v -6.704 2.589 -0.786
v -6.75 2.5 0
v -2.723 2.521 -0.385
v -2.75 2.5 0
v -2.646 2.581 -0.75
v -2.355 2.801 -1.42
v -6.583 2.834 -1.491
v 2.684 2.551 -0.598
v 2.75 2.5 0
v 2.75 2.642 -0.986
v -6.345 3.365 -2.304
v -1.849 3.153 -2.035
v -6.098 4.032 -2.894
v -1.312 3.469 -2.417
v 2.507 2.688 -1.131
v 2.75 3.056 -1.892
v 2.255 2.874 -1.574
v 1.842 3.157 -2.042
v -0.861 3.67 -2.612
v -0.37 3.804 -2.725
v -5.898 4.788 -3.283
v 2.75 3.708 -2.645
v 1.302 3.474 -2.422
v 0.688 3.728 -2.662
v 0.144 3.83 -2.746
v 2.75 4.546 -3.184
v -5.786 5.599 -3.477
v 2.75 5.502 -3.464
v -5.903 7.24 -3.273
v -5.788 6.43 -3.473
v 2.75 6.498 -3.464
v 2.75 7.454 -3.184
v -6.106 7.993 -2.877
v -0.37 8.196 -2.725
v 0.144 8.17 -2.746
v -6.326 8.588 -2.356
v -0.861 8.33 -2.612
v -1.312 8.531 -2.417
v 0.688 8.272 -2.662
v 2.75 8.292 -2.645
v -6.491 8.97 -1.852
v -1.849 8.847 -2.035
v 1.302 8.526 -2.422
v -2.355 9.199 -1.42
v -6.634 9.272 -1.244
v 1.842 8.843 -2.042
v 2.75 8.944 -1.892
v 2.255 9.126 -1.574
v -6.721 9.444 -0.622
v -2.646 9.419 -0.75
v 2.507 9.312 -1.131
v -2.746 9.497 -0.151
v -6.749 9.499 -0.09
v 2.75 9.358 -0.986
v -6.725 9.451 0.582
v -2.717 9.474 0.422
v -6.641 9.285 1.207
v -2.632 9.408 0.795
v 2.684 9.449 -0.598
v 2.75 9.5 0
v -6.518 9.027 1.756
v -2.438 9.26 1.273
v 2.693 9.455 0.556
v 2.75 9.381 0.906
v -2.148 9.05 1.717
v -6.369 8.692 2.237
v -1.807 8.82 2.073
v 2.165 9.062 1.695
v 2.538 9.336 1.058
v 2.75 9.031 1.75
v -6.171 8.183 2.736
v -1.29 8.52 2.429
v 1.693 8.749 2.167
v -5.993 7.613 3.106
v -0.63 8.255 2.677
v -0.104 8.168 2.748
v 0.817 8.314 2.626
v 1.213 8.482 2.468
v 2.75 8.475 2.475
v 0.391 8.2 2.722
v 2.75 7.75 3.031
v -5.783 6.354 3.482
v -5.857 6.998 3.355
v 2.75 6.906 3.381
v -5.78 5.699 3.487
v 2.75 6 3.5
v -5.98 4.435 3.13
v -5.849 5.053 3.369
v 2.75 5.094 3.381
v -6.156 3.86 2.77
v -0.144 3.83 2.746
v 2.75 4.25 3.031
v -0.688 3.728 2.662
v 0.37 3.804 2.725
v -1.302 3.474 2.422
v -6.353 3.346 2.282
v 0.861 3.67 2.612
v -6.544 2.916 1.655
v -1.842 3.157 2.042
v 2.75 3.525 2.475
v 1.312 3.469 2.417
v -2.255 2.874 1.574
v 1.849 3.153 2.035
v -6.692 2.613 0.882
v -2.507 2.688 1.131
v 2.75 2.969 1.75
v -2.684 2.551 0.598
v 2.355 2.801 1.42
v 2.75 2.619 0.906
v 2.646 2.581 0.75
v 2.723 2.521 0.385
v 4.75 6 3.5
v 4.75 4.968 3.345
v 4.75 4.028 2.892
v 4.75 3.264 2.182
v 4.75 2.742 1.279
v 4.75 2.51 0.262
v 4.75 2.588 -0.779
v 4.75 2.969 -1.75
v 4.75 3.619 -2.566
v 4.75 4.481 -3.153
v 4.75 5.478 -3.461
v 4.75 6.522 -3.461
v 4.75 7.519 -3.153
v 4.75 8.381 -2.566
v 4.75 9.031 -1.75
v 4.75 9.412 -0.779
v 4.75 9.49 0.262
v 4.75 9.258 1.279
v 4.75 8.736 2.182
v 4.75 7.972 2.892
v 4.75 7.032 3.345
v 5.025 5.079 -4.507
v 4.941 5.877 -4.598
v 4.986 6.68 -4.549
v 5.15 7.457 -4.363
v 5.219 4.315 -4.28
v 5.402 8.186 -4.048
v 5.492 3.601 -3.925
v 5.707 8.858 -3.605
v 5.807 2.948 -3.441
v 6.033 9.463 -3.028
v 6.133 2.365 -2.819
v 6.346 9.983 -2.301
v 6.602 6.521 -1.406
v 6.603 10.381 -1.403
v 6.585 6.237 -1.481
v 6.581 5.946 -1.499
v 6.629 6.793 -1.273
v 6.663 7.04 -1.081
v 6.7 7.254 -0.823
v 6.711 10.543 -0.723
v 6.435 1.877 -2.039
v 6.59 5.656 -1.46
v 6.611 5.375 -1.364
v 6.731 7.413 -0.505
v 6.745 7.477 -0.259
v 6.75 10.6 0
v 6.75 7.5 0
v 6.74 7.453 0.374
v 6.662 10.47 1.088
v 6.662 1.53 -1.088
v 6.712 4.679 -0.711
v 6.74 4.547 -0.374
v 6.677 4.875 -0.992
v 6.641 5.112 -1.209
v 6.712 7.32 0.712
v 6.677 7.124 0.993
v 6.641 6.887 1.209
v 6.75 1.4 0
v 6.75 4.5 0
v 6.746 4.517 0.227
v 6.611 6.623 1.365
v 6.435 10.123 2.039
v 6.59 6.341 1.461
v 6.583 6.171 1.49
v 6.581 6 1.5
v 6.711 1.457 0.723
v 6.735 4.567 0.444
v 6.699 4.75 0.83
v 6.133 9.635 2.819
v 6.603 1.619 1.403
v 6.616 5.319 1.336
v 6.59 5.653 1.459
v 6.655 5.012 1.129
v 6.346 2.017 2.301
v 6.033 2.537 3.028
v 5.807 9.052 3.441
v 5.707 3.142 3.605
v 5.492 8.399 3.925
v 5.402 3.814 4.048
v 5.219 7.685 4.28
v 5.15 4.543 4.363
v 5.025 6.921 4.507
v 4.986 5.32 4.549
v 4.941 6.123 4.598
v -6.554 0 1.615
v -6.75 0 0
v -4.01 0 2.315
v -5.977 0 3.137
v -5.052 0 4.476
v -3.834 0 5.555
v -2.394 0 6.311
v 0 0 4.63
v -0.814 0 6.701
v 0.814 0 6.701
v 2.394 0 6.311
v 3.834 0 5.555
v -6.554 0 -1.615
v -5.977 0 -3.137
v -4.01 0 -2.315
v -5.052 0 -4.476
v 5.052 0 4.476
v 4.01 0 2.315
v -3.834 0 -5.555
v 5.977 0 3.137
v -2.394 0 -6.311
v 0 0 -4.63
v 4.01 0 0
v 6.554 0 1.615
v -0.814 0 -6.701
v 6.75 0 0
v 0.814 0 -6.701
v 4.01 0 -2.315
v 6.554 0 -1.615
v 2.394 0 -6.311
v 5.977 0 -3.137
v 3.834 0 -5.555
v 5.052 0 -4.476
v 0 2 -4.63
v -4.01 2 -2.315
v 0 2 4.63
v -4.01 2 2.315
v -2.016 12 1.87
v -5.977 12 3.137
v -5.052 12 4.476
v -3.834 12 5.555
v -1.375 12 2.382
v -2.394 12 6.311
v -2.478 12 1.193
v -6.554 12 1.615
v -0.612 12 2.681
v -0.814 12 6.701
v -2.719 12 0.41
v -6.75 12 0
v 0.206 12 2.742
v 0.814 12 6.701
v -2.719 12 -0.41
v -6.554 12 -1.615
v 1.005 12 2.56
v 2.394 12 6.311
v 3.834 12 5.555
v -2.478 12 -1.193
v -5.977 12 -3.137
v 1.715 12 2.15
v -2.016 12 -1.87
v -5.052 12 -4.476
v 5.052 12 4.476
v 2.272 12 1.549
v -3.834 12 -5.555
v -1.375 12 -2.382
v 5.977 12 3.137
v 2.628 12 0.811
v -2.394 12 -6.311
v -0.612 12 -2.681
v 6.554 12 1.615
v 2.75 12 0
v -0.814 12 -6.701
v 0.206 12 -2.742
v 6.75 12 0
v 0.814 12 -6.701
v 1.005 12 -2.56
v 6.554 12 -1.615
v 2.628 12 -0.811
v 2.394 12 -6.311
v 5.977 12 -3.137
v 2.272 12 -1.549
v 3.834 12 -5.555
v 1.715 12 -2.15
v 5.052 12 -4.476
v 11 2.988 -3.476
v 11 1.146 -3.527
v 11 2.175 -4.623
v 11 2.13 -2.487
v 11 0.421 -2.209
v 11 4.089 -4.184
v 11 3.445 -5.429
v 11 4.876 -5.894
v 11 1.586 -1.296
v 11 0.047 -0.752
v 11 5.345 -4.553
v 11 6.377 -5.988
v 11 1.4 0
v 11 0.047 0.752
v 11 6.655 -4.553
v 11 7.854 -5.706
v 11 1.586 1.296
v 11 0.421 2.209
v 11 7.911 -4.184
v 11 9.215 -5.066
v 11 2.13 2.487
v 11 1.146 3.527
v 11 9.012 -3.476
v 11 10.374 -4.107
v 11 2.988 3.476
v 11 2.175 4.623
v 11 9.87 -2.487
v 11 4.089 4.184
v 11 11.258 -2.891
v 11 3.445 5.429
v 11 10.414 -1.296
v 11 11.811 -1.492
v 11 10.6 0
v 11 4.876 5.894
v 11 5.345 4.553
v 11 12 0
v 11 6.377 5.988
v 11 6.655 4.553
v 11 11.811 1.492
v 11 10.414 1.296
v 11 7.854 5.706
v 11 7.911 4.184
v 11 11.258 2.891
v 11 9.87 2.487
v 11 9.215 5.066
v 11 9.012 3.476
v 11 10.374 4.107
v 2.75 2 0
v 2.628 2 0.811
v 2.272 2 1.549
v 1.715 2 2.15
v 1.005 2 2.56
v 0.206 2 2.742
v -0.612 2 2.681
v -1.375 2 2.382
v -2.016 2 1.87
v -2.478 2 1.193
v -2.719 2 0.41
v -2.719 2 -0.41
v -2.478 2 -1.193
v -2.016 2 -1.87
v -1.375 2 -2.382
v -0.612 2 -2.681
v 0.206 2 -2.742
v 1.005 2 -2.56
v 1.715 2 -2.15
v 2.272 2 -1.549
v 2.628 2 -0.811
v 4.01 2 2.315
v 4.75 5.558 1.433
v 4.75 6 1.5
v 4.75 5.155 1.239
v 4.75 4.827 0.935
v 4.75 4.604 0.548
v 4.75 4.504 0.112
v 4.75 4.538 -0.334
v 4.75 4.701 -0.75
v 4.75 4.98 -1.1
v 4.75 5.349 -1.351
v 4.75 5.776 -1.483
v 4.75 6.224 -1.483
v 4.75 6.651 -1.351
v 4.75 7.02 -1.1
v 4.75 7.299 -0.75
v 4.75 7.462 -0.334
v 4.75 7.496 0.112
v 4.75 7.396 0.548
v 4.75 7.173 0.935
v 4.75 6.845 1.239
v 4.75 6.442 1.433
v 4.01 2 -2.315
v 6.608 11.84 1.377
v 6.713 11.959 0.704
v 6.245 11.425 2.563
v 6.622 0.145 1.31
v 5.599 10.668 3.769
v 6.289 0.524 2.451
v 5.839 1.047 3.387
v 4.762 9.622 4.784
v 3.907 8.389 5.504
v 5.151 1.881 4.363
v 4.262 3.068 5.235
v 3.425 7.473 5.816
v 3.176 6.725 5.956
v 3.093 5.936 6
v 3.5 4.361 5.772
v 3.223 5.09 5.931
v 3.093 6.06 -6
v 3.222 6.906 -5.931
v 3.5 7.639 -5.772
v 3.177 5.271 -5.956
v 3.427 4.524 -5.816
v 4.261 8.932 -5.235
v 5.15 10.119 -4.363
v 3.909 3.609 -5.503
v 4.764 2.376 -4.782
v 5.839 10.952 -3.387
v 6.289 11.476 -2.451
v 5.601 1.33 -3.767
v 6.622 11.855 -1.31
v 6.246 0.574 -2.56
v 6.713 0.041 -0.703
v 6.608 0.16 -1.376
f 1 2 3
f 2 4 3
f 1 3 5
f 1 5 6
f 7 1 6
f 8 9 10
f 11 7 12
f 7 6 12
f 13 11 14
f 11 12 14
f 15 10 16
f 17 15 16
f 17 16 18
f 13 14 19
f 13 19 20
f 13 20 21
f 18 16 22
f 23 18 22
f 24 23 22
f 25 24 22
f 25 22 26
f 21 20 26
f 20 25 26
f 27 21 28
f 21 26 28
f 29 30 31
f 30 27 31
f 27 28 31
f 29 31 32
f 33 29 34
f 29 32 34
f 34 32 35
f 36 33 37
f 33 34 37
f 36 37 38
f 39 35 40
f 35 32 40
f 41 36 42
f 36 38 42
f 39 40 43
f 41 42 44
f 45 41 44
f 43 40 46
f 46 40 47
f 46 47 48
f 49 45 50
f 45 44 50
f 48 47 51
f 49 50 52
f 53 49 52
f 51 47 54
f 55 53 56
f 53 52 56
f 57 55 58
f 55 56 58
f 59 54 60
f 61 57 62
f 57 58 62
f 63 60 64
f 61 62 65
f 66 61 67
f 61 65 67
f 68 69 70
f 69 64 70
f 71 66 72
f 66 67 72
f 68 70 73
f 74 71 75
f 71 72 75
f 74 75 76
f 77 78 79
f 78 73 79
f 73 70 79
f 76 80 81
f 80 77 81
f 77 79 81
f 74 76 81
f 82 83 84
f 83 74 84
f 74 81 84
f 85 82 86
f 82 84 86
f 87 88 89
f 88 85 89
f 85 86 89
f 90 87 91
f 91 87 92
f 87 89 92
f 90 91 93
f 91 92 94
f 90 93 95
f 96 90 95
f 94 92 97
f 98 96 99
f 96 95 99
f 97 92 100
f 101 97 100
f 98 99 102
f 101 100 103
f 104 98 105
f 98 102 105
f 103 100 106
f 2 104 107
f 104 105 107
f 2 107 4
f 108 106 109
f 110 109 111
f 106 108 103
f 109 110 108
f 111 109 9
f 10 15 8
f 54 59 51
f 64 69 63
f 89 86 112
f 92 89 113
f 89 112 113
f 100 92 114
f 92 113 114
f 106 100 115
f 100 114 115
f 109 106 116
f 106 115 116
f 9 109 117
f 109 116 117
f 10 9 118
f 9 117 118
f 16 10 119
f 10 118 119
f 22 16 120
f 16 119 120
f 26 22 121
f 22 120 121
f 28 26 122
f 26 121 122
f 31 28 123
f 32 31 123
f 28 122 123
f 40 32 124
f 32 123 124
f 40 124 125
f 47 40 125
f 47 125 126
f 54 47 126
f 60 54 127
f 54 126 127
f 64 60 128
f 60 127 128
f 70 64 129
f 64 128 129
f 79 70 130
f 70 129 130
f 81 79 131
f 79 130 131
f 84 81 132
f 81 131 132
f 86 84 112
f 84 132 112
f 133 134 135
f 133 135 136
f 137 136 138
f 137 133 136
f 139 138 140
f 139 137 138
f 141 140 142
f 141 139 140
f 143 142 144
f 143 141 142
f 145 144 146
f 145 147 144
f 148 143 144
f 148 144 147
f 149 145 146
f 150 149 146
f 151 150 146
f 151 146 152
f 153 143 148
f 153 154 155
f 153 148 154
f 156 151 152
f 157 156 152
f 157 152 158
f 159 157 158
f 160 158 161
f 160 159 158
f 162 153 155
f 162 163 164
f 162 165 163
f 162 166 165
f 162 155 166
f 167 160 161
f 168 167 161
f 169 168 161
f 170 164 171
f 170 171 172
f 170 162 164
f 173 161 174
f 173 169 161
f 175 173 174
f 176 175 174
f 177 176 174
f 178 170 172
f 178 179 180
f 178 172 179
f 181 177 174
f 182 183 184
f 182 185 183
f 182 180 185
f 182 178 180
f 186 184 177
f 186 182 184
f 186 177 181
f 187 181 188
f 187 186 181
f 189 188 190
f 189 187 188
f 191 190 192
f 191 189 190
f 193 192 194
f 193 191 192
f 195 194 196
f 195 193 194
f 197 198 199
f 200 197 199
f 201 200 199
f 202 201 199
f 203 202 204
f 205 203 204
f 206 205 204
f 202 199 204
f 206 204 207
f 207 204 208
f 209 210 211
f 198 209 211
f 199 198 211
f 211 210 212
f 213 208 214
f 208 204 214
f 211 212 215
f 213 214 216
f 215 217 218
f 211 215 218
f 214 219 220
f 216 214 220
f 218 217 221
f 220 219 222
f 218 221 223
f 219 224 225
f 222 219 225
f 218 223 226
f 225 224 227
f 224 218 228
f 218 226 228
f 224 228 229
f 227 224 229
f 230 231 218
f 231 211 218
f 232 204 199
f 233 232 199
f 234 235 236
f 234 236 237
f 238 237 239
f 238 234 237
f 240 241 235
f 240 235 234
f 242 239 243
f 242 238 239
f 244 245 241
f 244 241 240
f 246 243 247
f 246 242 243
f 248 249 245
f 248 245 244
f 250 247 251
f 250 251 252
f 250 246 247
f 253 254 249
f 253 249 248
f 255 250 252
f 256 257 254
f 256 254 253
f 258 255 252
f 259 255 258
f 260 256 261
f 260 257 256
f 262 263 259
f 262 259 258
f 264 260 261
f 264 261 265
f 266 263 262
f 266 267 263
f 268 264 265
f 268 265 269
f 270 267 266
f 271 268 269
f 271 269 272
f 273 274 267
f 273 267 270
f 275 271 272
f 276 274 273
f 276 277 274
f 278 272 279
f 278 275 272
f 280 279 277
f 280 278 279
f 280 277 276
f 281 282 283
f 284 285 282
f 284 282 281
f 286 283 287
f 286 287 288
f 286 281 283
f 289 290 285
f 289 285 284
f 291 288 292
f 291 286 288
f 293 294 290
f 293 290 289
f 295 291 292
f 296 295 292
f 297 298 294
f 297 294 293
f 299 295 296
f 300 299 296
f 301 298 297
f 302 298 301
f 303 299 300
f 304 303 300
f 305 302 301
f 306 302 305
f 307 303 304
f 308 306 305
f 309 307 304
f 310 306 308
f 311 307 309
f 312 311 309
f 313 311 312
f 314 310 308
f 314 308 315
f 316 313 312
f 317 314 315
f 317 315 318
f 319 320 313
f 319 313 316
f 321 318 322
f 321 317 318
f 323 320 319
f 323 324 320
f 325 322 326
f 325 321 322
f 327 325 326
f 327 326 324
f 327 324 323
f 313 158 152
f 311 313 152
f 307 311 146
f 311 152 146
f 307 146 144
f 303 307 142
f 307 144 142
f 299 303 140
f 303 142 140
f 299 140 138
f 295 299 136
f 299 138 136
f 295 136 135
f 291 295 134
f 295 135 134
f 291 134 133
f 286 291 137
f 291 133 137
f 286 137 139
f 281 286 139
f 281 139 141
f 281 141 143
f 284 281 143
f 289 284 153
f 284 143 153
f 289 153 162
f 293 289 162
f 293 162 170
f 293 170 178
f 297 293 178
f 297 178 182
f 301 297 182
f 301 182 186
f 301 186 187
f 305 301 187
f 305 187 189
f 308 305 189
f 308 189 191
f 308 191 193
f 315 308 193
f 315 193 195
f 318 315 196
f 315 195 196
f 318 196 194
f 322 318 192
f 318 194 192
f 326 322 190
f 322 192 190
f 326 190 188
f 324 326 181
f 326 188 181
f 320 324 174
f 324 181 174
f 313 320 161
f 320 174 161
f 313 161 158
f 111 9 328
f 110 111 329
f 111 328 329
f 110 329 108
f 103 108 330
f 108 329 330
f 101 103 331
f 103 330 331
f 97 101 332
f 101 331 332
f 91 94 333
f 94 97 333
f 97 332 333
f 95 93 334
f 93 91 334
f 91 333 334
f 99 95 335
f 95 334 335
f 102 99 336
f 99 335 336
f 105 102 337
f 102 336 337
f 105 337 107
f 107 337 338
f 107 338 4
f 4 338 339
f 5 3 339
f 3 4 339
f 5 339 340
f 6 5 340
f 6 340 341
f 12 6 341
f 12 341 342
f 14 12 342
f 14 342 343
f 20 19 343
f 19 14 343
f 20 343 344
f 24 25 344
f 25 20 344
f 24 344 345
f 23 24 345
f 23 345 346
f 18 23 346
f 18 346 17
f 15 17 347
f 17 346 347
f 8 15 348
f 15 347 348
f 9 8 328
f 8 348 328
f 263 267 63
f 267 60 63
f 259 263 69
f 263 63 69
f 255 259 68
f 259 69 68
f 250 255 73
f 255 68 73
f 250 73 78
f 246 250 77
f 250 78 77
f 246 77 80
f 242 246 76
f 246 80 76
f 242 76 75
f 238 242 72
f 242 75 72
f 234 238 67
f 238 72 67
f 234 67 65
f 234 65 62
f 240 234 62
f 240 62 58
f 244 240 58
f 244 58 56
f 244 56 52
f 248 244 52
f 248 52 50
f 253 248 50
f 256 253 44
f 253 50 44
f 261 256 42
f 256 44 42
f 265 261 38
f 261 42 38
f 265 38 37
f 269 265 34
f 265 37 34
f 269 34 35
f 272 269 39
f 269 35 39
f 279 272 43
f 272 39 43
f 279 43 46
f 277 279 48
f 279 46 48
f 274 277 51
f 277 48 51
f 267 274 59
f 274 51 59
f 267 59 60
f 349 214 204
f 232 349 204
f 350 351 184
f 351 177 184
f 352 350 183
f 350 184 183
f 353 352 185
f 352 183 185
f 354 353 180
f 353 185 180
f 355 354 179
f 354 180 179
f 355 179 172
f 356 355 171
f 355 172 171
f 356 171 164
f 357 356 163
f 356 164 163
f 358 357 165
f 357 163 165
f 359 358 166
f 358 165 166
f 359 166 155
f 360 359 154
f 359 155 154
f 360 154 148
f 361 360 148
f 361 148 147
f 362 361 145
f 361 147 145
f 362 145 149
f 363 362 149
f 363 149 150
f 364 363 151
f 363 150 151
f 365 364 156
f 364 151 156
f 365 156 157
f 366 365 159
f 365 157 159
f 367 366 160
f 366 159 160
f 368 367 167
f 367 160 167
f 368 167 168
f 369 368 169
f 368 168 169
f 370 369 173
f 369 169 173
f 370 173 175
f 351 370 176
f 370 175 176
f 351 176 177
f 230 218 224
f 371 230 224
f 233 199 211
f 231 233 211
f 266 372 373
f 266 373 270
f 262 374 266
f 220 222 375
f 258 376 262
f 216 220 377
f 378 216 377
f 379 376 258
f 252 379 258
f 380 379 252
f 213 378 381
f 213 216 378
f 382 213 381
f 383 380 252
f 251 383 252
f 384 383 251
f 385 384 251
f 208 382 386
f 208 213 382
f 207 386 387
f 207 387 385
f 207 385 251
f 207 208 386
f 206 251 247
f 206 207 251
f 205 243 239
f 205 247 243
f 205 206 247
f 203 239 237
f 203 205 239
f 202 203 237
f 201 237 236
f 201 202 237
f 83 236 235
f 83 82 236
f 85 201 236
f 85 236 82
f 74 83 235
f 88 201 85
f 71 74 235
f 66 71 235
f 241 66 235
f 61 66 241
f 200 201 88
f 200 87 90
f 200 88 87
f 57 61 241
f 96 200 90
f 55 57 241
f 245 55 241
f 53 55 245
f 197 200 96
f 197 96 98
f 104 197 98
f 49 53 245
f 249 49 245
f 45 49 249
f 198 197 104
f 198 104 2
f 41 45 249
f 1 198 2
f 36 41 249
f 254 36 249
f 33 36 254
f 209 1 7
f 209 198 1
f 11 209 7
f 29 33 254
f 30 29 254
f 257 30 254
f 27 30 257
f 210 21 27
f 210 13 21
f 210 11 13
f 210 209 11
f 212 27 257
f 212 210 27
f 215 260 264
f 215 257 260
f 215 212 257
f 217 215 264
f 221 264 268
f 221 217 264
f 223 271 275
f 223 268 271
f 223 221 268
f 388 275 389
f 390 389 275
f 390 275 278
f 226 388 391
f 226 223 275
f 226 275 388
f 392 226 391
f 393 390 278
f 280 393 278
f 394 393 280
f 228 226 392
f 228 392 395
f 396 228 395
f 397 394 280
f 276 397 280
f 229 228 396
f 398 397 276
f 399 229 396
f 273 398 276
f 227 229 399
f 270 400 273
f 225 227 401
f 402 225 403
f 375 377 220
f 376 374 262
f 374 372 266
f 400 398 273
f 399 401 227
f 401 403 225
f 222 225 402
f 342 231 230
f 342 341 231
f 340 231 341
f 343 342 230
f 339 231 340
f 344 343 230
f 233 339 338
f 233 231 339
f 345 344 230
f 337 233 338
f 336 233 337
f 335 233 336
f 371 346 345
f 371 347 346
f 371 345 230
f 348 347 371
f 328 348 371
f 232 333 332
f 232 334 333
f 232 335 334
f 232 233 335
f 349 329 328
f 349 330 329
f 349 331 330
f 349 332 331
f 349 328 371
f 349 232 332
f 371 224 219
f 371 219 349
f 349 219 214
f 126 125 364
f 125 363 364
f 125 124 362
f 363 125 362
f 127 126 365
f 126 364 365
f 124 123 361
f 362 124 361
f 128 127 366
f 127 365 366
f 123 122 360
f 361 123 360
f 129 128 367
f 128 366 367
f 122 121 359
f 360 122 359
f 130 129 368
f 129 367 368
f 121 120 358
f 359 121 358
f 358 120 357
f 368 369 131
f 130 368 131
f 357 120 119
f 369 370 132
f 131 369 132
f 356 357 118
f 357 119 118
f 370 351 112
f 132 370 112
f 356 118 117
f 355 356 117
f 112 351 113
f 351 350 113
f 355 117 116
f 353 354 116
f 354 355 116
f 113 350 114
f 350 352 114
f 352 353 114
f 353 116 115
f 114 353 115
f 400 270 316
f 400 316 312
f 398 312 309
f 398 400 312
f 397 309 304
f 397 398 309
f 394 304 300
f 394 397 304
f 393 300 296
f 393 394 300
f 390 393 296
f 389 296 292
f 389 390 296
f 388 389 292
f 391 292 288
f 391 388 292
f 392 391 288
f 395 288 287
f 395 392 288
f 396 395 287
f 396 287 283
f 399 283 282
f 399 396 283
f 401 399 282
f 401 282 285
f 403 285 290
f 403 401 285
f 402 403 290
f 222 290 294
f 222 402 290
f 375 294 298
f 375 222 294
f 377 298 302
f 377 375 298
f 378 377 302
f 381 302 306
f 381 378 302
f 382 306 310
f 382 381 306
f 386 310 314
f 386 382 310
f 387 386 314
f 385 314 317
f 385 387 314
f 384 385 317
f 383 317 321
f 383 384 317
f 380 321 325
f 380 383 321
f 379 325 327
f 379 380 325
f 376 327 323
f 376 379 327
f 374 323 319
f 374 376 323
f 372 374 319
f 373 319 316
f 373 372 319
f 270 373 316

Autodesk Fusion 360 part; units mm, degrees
sketch "Sketch1" plane through (0, 0, 0) normal (0, 1, 0) x (1, 0, 0)
  circle A0 centre (0, 0) radius 2.75
  circle A1 centre (0, 0) radius 6.75
  dimension "d1" = 5.5
  dimension "d2" = 4
extrude "Extrude1" add sketch "Sketch1" along normal blind 12
ref_plane "WorkPlane1" through (3, 0, 0) normal (1, 0, 0) x (0, 1, 0)
sketch "Sketch2" plane through (3, 0, 0) normal (1, 0, 0) x (0, 1, 0)
  line L0 (12, -6.75) -> (12, 6.75)
  line L1 (0, -6.75) -> (0, 6.75)
  circle A0 centre (6, 0) radius 4.6
  circle A1 centre (6, 0) radius 6
  dimension "d6" = 9.2
  dimension "d7" = 6
  dimension "d8" = 12
  dimension "d9" = 1.4
extrude "Extrude2" add sketch "Sketch2" along normal blind 8
ref_plane "WorkPlane2" through (2.75, 6.403, 0) normal (-1, 0, 0) x (0, 0, -1)
sketch "Sketch3" plane through (2.75, 6.403, 0) normal (-1, 0, 0) x (0, -1, 0)
  line L0 (-5.597, -2.75) -> (-5.597, 2.75)
  line L1 (6.403, -2.75) -> (6.403, 2.75)
  line L2 (6.403, -2.75) -> (6.403, 2.75)
  line L3 (-5.597, -2.75) -> (-5.597, 2.75)
  circle A0 centre (0.403, 0) radius 3.5
  point P0 (0.403, 0)
  dimension "d13" = 6
  dimension "d14" = 12
  dimension "d20" = 7
hole "Hole1" at (2.75, 6, 0) direction (1, 0, 0) diameter 3 depth 10 tip angle 118 counterbore diameter 7 counterbore depth 2
extrude "Extrude3" cut sketch "Sketch3" along normal blind 14.5
sketch "Sketch4" plane through (0, 0, 0) normal (0, -1, 0) x (1, 0, 0)
  circle A0 centre (0, 0) radius 2.75
  circle A1 centre (0, 0) radius 6.75
  line L0 (4, 2.3094) -> (0, 4.6188)
  line L1 (0, 4.6188) -> (-4, 2.3094)
  line L2 (-4, 2.3094) -> (-4, -2.3094)
  line L3 (-4, -2.3094) -> (0, -4.6188)
  line L4 (0, -4.6188) -> (4, -2.3094)
  line L5 (4, -2.3094) -> (4, 2.3094)
  line L6 (-4.01, -2.3152) -> (0, -4.6303)
  line L7 (0, -4.6303) -> (4.01, -2.3152)
  line L8 (4.01, -2.3152) -> (4.01, 2.3152)
  line L9 (4.01, 2.3152) -> (0, 4.6303)
  line L10 (0, 4.6303) -> (-4.01, 2.3152)
  line L11 (-4.01, 2.3152) -> (-4.01, -2.3152)
  dimension "d23" = 0.01
extrude "Extrude4" cut sketch "Sketch4" against normal blind 2 contours L0 L1 L2 L3 L4 L5 | L6 L7 L8 L9 L10 L11
equation "d1 = 5 mm + 0.5 mm"
equation "d6 = 9 mm + 0.2 mm"
equation "d7 = d8 / 2"
equation "d13 = d14 / 2"
